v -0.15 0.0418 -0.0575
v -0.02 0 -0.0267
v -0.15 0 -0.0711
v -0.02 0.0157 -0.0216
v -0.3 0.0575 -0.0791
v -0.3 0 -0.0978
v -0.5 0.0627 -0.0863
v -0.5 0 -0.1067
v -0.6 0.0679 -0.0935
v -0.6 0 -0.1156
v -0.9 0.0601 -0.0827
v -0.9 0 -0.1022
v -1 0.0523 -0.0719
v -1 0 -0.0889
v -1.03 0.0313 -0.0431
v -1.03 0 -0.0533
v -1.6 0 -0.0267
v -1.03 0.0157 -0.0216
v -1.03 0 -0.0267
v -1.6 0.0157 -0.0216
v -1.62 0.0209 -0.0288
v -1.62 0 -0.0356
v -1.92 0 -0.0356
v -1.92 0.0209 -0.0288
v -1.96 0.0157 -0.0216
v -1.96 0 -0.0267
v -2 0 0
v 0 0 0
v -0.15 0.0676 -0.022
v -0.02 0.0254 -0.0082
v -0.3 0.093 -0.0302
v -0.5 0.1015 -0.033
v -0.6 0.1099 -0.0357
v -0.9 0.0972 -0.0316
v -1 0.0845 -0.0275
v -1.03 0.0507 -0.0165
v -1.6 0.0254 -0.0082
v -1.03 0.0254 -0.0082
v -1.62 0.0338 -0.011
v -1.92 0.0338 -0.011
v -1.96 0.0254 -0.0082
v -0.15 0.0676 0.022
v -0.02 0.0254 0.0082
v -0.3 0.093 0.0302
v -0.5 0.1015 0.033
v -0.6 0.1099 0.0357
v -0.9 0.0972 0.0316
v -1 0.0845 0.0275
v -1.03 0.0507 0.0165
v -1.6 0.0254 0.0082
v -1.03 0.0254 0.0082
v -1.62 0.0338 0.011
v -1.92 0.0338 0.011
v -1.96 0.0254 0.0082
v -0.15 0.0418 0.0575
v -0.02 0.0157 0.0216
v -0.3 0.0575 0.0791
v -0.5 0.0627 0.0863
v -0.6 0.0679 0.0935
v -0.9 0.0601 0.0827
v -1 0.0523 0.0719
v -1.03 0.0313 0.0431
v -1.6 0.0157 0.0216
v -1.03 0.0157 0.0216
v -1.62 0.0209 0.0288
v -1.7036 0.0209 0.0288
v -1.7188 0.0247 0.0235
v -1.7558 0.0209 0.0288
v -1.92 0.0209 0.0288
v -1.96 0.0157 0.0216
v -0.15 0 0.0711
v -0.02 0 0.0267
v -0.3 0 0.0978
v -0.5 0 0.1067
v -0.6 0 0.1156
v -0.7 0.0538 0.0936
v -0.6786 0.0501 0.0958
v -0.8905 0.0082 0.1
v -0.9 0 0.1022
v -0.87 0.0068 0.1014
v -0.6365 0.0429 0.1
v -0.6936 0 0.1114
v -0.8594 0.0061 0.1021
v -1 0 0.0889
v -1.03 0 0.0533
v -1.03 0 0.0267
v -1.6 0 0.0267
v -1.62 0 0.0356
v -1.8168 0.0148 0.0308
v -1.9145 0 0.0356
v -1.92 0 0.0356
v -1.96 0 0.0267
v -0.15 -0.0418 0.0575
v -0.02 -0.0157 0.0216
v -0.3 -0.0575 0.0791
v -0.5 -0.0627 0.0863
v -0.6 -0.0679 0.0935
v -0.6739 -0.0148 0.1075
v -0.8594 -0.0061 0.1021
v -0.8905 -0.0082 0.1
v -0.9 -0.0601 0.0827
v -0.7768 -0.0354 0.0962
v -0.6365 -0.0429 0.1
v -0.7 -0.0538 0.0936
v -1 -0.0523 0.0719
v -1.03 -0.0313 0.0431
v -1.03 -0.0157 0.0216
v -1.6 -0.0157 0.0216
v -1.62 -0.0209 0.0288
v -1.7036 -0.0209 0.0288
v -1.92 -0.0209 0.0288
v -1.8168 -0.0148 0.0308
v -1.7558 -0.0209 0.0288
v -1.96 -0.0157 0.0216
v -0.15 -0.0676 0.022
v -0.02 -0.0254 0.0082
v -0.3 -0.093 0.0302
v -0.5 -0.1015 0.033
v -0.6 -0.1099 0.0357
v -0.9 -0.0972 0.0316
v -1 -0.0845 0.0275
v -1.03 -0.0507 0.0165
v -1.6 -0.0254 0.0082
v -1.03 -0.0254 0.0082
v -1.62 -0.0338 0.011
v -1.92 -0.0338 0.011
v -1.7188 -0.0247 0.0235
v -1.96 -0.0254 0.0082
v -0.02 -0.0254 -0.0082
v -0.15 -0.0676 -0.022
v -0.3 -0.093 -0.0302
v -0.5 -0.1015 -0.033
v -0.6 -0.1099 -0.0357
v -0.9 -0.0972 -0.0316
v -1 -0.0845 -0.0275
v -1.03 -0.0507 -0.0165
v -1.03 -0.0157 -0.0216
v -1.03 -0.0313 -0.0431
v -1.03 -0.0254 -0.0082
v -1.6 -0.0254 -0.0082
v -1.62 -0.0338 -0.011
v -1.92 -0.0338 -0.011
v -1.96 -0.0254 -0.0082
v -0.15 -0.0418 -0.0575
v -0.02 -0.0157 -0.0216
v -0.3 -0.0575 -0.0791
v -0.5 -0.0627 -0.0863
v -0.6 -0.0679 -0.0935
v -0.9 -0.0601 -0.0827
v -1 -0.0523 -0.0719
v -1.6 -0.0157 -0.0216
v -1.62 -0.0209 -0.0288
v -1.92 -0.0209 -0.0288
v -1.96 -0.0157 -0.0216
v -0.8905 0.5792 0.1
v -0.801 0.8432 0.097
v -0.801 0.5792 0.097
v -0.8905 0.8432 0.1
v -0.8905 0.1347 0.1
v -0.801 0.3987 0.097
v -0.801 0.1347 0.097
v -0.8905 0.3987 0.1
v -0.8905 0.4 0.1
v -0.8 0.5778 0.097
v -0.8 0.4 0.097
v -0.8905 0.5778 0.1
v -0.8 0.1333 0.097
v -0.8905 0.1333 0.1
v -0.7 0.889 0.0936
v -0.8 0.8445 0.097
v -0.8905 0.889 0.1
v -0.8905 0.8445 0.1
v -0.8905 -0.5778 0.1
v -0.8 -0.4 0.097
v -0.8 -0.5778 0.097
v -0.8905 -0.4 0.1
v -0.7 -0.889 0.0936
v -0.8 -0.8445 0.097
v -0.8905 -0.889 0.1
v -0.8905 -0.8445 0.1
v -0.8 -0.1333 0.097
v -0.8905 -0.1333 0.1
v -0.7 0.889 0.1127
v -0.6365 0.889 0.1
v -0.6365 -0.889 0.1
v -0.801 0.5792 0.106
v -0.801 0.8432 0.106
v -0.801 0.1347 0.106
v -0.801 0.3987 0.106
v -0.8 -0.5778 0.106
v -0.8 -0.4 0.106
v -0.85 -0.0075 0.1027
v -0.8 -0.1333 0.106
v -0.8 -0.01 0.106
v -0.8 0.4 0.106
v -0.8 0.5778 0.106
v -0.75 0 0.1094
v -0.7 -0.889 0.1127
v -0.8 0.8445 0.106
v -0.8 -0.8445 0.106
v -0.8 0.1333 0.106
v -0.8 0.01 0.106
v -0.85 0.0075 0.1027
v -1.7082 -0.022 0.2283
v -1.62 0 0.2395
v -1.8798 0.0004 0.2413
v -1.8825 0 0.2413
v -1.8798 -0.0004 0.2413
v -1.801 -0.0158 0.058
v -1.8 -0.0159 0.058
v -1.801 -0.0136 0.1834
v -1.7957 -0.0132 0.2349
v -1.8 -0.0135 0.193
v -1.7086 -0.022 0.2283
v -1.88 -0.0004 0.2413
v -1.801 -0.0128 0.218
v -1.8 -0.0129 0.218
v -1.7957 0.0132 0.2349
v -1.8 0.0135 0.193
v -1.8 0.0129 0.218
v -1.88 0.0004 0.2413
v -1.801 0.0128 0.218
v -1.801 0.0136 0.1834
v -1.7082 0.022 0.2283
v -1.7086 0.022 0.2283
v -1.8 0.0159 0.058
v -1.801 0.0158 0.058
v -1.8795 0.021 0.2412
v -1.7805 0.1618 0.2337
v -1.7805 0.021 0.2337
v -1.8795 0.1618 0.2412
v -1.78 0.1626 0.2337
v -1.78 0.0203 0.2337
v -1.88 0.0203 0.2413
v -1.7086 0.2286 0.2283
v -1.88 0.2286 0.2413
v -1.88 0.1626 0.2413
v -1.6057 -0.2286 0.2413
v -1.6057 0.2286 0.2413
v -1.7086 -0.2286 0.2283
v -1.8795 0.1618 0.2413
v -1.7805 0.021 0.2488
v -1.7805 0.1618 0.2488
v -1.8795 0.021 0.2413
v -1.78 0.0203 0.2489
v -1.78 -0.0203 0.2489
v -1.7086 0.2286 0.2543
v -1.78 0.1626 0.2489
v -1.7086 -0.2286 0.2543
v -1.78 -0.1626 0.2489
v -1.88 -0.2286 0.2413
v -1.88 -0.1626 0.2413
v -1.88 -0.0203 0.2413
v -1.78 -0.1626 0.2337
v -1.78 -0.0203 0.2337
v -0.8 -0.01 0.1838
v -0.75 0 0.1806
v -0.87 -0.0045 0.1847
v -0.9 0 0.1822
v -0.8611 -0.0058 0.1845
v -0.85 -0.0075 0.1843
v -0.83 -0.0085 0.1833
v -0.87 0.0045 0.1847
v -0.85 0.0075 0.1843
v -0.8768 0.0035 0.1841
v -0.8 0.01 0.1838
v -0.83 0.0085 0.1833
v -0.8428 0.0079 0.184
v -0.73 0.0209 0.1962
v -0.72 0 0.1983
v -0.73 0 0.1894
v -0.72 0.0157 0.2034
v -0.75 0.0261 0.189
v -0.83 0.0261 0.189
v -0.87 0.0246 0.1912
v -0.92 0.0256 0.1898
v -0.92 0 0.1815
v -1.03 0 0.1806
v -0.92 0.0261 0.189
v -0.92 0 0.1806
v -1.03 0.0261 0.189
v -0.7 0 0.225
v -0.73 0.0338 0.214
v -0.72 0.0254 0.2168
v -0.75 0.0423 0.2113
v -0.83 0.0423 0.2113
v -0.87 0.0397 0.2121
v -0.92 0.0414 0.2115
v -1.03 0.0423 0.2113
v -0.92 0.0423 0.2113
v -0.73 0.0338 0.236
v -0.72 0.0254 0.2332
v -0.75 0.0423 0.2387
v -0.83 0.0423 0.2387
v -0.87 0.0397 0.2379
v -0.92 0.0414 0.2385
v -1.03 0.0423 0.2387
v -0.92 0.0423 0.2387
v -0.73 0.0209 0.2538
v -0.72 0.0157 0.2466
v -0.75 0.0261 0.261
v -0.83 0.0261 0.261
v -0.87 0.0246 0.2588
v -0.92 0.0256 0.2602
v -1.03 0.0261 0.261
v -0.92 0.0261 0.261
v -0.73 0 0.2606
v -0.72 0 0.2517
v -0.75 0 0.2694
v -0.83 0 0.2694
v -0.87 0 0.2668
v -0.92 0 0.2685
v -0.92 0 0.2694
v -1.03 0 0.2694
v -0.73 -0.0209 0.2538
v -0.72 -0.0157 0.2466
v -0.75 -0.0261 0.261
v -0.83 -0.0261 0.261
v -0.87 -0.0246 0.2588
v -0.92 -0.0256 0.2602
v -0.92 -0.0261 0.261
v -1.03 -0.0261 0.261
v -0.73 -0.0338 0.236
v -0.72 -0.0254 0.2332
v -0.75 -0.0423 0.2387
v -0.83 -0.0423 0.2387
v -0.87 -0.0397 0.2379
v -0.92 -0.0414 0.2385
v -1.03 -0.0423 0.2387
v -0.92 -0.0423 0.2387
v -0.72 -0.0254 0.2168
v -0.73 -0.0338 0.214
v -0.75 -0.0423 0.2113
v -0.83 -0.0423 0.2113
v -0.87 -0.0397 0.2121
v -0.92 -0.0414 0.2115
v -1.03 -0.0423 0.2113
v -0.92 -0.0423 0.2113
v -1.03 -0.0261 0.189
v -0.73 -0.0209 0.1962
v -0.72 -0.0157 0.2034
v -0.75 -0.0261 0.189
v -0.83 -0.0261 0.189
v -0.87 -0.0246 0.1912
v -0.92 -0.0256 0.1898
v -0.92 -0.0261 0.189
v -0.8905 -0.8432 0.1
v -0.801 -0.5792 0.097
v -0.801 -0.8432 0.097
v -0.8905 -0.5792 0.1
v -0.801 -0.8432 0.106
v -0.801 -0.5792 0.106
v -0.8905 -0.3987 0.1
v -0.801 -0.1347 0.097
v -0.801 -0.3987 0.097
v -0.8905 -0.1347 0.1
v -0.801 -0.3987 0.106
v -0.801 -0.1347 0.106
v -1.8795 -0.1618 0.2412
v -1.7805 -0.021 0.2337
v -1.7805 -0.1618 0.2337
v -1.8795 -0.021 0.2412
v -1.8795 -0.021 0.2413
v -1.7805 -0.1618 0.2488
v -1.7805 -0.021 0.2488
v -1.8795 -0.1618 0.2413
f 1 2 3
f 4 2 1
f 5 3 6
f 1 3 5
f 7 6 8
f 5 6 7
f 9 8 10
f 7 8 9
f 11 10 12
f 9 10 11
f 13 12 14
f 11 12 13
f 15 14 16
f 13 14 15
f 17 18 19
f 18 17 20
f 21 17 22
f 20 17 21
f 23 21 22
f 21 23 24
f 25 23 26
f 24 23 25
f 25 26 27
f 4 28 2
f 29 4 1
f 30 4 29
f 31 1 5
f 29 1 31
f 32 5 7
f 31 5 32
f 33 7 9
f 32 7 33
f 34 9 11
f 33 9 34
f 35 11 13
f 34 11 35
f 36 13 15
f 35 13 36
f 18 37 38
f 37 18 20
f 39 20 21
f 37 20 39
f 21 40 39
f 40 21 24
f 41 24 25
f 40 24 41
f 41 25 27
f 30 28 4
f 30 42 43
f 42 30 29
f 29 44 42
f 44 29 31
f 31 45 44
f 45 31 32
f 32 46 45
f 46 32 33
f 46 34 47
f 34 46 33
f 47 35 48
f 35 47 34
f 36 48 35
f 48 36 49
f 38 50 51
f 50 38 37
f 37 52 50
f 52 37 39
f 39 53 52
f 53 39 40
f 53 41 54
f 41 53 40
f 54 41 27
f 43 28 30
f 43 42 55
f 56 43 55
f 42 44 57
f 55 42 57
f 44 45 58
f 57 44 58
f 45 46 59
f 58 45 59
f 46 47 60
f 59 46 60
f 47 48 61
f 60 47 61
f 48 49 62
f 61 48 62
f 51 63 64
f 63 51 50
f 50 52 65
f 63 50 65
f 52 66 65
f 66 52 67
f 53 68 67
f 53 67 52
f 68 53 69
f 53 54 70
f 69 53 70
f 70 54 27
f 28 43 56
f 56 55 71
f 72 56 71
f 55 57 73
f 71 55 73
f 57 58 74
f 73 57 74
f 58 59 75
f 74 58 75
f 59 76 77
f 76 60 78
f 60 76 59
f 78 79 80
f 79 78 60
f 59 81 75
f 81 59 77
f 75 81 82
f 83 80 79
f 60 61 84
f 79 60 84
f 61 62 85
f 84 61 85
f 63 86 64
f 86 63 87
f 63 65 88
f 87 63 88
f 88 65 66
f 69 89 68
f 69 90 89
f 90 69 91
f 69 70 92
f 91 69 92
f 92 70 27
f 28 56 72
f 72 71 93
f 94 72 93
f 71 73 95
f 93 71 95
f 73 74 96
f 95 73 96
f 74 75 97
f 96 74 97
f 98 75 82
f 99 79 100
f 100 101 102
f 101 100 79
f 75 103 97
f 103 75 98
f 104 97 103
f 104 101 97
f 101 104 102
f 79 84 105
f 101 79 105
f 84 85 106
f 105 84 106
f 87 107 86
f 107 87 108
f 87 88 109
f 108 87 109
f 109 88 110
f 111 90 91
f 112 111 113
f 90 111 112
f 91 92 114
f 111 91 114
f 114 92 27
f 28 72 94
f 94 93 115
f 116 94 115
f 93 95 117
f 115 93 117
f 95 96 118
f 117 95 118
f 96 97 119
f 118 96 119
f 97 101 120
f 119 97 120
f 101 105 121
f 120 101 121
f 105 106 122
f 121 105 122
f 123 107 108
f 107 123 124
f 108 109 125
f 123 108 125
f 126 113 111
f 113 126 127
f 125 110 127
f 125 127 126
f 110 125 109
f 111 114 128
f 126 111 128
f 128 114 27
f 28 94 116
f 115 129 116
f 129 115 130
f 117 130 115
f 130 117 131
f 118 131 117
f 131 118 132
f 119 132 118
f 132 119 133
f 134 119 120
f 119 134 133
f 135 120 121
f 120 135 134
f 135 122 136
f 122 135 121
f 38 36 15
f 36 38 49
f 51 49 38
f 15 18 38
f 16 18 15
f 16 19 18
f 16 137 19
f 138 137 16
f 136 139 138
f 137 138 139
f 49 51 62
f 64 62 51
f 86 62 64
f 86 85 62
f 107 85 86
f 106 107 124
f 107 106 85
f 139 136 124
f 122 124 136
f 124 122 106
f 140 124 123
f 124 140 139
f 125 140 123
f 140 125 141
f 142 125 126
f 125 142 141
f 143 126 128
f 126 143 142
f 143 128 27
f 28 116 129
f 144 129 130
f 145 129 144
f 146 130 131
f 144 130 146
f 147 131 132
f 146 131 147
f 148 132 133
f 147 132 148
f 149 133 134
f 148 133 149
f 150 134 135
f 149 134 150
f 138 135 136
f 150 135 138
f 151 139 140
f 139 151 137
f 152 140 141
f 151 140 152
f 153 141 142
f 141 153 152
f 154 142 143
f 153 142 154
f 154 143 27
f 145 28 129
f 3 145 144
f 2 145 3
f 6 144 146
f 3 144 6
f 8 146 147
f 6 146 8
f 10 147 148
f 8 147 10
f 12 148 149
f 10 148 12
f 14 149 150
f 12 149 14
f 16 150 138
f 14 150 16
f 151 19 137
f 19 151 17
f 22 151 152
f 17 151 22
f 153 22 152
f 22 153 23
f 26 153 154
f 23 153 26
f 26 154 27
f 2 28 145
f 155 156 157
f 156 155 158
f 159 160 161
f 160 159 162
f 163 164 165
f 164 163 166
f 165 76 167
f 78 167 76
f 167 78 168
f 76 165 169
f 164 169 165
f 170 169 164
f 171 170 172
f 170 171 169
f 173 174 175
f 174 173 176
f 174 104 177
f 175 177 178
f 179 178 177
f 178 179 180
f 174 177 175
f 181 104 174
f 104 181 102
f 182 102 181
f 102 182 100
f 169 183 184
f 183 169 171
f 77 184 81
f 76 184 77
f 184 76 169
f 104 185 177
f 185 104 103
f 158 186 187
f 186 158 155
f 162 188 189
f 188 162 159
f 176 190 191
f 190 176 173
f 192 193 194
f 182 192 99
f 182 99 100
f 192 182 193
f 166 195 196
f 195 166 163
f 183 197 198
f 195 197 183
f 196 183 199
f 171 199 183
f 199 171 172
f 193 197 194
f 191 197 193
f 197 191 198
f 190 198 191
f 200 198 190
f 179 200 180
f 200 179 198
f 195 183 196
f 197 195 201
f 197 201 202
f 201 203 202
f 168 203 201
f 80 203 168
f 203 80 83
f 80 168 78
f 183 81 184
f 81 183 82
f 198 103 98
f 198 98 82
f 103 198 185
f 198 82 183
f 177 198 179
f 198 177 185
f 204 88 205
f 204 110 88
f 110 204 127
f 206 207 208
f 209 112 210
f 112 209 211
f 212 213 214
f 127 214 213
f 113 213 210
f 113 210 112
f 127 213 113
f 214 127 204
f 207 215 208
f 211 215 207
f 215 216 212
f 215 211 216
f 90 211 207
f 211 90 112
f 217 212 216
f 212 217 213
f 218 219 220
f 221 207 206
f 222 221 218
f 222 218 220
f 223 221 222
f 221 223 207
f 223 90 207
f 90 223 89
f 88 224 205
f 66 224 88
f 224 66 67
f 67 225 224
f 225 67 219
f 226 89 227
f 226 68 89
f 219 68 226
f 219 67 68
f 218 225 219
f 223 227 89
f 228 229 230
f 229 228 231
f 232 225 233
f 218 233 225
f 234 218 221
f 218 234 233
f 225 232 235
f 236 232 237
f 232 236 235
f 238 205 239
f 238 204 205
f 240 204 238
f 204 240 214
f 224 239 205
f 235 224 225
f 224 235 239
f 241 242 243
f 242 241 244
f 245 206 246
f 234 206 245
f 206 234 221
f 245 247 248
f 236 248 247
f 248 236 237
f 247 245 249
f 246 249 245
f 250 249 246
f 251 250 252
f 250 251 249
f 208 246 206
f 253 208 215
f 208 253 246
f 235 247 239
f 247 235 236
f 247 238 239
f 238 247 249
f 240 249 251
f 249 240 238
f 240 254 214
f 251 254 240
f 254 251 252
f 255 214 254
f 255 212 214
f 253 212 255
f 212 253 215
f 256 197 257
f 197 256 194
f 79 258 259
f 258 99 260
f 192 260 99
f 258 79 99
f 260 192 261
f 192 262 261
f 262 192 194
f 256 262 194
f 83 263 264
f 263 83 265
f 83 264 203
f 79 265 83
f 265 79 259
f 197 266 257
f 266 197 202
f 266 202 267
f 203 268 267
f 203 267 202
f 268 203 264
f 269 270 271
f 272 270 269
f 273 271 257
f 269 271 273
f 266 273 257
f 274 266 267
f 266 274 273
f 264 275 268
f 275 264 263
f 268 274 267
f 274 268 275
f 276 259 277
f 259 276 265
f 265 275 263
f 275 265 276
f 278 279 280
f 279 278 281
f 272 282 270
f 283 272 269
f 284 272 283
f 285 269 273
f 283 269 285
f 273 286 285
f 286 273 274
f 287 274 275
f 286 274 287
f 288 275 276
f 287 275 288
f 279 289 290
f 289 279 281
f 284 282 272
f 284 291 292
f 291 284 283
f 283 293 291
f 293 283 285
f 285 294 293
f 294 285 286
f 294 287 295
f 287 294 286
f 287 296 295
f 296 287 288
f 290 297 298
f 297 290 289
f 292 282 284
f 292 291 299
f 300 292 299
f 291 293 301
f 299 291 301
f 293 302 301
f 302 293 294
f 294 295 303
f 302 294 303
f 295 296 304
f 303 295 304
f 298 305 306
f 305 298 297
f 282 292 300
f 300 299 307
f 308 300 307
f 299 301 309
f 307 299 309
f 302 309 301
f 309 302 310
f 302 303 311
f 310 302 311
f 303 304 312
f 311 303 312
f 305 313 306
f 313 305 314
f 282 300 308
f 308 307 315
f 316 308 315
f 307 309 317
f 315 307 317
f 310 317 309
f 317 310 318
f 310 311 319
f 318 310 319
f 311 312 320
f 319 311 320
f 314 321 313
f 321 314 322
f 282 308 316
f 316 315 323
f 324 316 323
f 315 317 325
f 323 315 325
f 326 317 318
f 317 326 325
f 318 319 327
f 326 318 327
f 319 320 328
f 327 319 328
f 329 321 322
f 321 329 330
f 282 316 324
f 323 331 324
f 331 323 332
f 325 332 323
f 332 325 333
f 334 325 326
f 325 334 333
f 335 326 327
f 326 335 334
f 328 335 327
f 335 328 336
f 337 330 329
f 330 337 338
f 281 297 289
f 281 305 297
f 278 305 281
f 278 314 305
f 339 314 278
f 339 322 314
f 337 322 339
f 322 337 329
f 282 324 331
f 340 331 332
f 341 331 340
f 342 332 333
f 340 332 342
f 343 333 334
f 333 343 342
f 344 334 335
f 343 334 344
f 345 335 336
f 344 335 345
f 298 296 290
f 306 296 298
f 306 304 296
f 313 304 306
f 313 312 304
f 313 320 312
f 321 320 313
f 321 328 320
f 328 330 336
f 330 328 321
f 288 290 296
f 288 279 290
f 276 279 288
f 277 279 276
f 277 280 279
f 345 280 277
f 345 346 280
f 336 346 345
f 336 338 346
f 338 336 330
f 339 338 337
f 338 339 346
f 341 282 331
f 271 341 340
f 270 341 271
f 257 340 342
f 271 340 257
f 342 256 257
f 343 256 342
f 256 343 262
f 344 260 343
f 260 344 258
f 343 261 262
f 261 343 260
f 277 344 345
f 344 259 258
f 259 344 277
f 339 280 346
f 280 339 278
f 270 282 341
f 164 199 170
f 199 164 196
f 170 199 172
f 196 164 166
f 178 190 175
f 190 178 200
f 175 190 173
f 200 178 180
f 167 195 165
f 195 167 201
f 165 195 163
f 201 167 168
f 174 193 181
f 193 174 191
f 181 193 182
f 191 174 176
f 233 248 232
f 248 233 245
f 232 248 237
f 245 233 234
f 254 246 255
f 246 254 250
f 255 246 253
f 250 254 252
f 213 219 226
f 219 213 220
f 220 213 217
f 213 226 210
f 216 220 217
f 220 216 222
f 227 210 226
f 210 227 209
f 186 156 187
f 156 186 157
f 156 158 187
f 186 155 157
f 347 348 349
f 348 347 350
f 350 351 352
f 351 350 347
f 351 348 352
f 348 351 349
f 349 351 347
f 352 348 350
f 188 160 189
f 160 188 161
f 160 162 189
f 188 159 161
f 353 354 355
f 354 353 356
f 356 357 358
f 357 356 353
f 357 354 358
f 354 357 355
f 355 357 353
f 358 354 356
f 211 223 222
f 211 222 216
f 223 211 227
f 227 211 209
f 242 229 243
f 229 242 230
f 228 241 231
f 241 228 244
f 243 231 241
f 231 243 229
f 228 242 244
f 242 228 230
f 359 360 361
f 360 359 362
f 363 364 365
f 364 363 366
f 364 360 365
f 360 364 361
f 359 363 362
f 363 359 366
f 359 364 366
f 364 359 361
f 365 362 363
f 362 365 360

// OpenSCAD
$fn=10;
length = 2;
wingspan = 1.778;

chord = 0.254;
taper = 1;
wing_loc = 0.1;

tail_boom = 0.15;

tail_span = 0.2286;
tail_chord = 0.26;
tail_taper = 0.8571;

vert_span = 0.2413;
vert_chord = 0.2032;
vert_taper = 0.875;

tail_loc = vert_span;

module wing(chord, wingspan, taper, wing_location) {
    color([0.6, 0.6, 0.6]) translate([-0.75*chord, 0]) rotate([90, 0, 180]) linear_extrude(height=wingspan/2, scale=taper) polygon([
        [0, wing_loc],
        [-chord*0.75, wing_loc + 0.05*chord],
        [-chord, wing_loc],
        [-chord*0.75, wing_loc - 0.025*chord]
    ]);
}

module wing_sym(chord, wingspan, taper) {
    color([0.6, 0.6, 0.6]) translate([-0.75*chord, 0]) rotate([90, 0, 180]) linear_extrude(height=wingspan/2, scale=taper) polygon([
        [0, wing_loc],
        [-chord*0.75, wing_loc + 0.05*chord],
        [-chord, wing_loc],
        [-chord*0.75, wing_loc - 0.05*chord]
    ]);
}

module airframe_half() {
    translate([-length*0.35, 0]) wing(chord, wingspan, taper);
    translate([-length*0.7, 0]) wing(tail_chord, tail_span, tail_taper);
    translate([-length*0.7, 0]) rotate([90, 0, 0]) 
        wing(vert_chord, vert_span, vert_taper);
}

module body() {
    color([0.6, 0.6, 0.6]) rotate([0, -90, 0]) rotate_extrude() polygon([
        [0,0],
        [0.015*wingspan,0.01*length],
        [0.04*wingspan,0.075*length],
        [0.055*wingspan,0.15*length],
        [0.06*wingspan,0.25*length],
        [0.065*wingspan,0.3*length],
        [0.0625*wingspan,0.35*length],
        [0.0575*wingspan,0.45*length],
        [0.05*wingspan,0.5*length],
        [0.03*wingspan,0.515*length],
        [0.015*wingspan,0.515*length],
        [0.015*wingspan,0.80*length],
        [0.02*wingspan,0.81*length],
        [0.02*wingspan,0.96*length],
        [0.015*wingspan,0.98*length],
        [0,length]
    ]);
}

module vertical_tail() {
    color([0.6, 0.6, 0.6]) translate([-0.81*length, 0]) rotate([0, 0, 180]) linear_extrude(height=vert_span, scale=vert_taper) polygon([
        [0, 0],
        [0.05*length, 0.025],
        [0.1*length, 0.015],
        [0.15*length, 0]
    ]);
}

module horizontal_tail() {
    color([0.6, 0.6, 0.6]) translate([-0.94*length, 0]) rotate([90, 0, 180]) linear_extrude(height=tail_span, scale=1) polygon([
        [0, tail_loc],
        [-tail_span*0.75, tail_loc + 0.05*tail_chord],
        [-tail_span*1.2, tail_loc],
        [-tail_span*0.75, tail_loc - 0.05*tail_chord]
    ]);
}

module pylon() {
    color([0.6, 0.6, 0.6]) translate([-0.375*length, 0]) rotate([0, 0, 180]) linear_extrude(height=0.2, scale=taper) polygon([
        [0, 0],
        [0.025*length, 0.01],
        [0.05*length, 0.0075],
        [0.075*length, 0]
    ]);
}

module motor() {
    color([0.6, 0.6, 0.6]) translate([-0.35*length, 0]) rotate([0, -90, 0]) rotate_extrude() polygon([
        [0,0],
        [0.015*wingspan,0.01*length],
        [0.02*wingspan,0.015*length],
        [0.025*wingspan,0.025*length],
        [0.025*wingspan,0.045*length],
        [0.025*wingspan,0.065*length],
        [0.0235*wingspan,0.085*length],
        [0.0245*wingspan, 0.11*length],
        [0.025*wingspan, 0.11*length],
        [0.025*wingspan, 0.165*length],
        [0, 0.165*length]
    ]);
}

module propeller() {
    
}

module airframe_no_cuts() {
    body();
    translate([-length*0.35, 0]) wing(chord, wingspan, taper);
    mirror([0, 1, 0]) translate([-length*0.35, 0]) wing(chord, wingspan, taper);
    vertical_tail(1);
    mirror([0, 1, 0]) vertical_tail(1);
    horizontal_tail(1);
    mirror([0, 1, 0]) horizontal_tail(1);
    pylon(1);
    mirror([0, 1, 0]) pylon();
    translate([0, 0, 0.225]) motor(1);
}

module aileron_cut(s) {
    translate([-0.45*length, wingspan*0.4, wing_loc]) scale([s, s, 1]) cube([length*0.1, wingspan*0.15, length*0.1], center=true);
}

module flap_cut(s) {
    translate([-0.45*length, wingspan*0.15, wing_loc]) scale([s, s, 1]) cube([length*0.1, wingspan*0.15, length*0.1], center=true);
}

module elevator_cut(s) {
    translate([-0.915*length, tail_span*0.4, 0.3]) scale([s, s, 1]) cube([length*0.05, wingspan*0.08, length*0.075], center=true);
}

module rudder_cut(s) {
    translate([-length*0.95, 0, length*0.069]) scale([s, s, 1]) cube([length*0.1, wingspan*0.2, length*0.08], center=true);
}

module airframe() {
    difference() {
        airframe_no_cuts();
        aileron_cut(1);
        mirror([0, 1, 0]) aileron_cut(1);
        flap_cut(1);
        mirror([0, 1, 0]) flap_cut(1);
        elevator_cut(1);
        mirror([0, 1, 0]) elevator_cut(1);
        rudder_cut(1);
        mirror([0, 1, 0]) rudder_cut(1);
        translate([-4.5, 0, 0.5]) cube([2, 0.8, 2], center=true); // cockpit
    }
}

module aileron() {
    color("red") render() intersection() {
        aileron_cut(0.99);
        airframe_no_cuts();
    }
}

module flap() {
    color("green") render() intersection() {
        flap_cut(0.99);
        airframe_no_cuts();
    }
}

module elevator() {
    color("blue") render() intersection() {
        elevator_cut(0.99);
        airframe_no_cuts();
    }
}

module rudder() {
    color("black") render() intersection() {
        rudder_cut(0.99);
        airframe_no_cuts();
    }
}

module assembly() {
    airframe();
    aileron();
    mirror([0, 1, 0]) aileron();
    flap();
    mirror([0, 1, 0]) flap();
    rudder();
    elevator();
    mirror([0, 1, 0]) elevator();
}

part = "assembly";

if (part == "airframe") {
    airframe();
} else if (part == "left_aileron") {
    aileron();
} else if (part == "left_flap") {
    flap();
} else if (part == "left_elevator") {
    elevator();
} else if (part == "right_aileron") {
    mirror([0, 1, 0]) aileron();
} else if (part == "right_flap") {
    mirror([0, 1, 0]) flap();    
} else if (part == "right_elevator") {
    mirror([0, 1, 0]) elevator();
} else if (part == "rudder") {
    rudder();
} else {
    assembly();
}
